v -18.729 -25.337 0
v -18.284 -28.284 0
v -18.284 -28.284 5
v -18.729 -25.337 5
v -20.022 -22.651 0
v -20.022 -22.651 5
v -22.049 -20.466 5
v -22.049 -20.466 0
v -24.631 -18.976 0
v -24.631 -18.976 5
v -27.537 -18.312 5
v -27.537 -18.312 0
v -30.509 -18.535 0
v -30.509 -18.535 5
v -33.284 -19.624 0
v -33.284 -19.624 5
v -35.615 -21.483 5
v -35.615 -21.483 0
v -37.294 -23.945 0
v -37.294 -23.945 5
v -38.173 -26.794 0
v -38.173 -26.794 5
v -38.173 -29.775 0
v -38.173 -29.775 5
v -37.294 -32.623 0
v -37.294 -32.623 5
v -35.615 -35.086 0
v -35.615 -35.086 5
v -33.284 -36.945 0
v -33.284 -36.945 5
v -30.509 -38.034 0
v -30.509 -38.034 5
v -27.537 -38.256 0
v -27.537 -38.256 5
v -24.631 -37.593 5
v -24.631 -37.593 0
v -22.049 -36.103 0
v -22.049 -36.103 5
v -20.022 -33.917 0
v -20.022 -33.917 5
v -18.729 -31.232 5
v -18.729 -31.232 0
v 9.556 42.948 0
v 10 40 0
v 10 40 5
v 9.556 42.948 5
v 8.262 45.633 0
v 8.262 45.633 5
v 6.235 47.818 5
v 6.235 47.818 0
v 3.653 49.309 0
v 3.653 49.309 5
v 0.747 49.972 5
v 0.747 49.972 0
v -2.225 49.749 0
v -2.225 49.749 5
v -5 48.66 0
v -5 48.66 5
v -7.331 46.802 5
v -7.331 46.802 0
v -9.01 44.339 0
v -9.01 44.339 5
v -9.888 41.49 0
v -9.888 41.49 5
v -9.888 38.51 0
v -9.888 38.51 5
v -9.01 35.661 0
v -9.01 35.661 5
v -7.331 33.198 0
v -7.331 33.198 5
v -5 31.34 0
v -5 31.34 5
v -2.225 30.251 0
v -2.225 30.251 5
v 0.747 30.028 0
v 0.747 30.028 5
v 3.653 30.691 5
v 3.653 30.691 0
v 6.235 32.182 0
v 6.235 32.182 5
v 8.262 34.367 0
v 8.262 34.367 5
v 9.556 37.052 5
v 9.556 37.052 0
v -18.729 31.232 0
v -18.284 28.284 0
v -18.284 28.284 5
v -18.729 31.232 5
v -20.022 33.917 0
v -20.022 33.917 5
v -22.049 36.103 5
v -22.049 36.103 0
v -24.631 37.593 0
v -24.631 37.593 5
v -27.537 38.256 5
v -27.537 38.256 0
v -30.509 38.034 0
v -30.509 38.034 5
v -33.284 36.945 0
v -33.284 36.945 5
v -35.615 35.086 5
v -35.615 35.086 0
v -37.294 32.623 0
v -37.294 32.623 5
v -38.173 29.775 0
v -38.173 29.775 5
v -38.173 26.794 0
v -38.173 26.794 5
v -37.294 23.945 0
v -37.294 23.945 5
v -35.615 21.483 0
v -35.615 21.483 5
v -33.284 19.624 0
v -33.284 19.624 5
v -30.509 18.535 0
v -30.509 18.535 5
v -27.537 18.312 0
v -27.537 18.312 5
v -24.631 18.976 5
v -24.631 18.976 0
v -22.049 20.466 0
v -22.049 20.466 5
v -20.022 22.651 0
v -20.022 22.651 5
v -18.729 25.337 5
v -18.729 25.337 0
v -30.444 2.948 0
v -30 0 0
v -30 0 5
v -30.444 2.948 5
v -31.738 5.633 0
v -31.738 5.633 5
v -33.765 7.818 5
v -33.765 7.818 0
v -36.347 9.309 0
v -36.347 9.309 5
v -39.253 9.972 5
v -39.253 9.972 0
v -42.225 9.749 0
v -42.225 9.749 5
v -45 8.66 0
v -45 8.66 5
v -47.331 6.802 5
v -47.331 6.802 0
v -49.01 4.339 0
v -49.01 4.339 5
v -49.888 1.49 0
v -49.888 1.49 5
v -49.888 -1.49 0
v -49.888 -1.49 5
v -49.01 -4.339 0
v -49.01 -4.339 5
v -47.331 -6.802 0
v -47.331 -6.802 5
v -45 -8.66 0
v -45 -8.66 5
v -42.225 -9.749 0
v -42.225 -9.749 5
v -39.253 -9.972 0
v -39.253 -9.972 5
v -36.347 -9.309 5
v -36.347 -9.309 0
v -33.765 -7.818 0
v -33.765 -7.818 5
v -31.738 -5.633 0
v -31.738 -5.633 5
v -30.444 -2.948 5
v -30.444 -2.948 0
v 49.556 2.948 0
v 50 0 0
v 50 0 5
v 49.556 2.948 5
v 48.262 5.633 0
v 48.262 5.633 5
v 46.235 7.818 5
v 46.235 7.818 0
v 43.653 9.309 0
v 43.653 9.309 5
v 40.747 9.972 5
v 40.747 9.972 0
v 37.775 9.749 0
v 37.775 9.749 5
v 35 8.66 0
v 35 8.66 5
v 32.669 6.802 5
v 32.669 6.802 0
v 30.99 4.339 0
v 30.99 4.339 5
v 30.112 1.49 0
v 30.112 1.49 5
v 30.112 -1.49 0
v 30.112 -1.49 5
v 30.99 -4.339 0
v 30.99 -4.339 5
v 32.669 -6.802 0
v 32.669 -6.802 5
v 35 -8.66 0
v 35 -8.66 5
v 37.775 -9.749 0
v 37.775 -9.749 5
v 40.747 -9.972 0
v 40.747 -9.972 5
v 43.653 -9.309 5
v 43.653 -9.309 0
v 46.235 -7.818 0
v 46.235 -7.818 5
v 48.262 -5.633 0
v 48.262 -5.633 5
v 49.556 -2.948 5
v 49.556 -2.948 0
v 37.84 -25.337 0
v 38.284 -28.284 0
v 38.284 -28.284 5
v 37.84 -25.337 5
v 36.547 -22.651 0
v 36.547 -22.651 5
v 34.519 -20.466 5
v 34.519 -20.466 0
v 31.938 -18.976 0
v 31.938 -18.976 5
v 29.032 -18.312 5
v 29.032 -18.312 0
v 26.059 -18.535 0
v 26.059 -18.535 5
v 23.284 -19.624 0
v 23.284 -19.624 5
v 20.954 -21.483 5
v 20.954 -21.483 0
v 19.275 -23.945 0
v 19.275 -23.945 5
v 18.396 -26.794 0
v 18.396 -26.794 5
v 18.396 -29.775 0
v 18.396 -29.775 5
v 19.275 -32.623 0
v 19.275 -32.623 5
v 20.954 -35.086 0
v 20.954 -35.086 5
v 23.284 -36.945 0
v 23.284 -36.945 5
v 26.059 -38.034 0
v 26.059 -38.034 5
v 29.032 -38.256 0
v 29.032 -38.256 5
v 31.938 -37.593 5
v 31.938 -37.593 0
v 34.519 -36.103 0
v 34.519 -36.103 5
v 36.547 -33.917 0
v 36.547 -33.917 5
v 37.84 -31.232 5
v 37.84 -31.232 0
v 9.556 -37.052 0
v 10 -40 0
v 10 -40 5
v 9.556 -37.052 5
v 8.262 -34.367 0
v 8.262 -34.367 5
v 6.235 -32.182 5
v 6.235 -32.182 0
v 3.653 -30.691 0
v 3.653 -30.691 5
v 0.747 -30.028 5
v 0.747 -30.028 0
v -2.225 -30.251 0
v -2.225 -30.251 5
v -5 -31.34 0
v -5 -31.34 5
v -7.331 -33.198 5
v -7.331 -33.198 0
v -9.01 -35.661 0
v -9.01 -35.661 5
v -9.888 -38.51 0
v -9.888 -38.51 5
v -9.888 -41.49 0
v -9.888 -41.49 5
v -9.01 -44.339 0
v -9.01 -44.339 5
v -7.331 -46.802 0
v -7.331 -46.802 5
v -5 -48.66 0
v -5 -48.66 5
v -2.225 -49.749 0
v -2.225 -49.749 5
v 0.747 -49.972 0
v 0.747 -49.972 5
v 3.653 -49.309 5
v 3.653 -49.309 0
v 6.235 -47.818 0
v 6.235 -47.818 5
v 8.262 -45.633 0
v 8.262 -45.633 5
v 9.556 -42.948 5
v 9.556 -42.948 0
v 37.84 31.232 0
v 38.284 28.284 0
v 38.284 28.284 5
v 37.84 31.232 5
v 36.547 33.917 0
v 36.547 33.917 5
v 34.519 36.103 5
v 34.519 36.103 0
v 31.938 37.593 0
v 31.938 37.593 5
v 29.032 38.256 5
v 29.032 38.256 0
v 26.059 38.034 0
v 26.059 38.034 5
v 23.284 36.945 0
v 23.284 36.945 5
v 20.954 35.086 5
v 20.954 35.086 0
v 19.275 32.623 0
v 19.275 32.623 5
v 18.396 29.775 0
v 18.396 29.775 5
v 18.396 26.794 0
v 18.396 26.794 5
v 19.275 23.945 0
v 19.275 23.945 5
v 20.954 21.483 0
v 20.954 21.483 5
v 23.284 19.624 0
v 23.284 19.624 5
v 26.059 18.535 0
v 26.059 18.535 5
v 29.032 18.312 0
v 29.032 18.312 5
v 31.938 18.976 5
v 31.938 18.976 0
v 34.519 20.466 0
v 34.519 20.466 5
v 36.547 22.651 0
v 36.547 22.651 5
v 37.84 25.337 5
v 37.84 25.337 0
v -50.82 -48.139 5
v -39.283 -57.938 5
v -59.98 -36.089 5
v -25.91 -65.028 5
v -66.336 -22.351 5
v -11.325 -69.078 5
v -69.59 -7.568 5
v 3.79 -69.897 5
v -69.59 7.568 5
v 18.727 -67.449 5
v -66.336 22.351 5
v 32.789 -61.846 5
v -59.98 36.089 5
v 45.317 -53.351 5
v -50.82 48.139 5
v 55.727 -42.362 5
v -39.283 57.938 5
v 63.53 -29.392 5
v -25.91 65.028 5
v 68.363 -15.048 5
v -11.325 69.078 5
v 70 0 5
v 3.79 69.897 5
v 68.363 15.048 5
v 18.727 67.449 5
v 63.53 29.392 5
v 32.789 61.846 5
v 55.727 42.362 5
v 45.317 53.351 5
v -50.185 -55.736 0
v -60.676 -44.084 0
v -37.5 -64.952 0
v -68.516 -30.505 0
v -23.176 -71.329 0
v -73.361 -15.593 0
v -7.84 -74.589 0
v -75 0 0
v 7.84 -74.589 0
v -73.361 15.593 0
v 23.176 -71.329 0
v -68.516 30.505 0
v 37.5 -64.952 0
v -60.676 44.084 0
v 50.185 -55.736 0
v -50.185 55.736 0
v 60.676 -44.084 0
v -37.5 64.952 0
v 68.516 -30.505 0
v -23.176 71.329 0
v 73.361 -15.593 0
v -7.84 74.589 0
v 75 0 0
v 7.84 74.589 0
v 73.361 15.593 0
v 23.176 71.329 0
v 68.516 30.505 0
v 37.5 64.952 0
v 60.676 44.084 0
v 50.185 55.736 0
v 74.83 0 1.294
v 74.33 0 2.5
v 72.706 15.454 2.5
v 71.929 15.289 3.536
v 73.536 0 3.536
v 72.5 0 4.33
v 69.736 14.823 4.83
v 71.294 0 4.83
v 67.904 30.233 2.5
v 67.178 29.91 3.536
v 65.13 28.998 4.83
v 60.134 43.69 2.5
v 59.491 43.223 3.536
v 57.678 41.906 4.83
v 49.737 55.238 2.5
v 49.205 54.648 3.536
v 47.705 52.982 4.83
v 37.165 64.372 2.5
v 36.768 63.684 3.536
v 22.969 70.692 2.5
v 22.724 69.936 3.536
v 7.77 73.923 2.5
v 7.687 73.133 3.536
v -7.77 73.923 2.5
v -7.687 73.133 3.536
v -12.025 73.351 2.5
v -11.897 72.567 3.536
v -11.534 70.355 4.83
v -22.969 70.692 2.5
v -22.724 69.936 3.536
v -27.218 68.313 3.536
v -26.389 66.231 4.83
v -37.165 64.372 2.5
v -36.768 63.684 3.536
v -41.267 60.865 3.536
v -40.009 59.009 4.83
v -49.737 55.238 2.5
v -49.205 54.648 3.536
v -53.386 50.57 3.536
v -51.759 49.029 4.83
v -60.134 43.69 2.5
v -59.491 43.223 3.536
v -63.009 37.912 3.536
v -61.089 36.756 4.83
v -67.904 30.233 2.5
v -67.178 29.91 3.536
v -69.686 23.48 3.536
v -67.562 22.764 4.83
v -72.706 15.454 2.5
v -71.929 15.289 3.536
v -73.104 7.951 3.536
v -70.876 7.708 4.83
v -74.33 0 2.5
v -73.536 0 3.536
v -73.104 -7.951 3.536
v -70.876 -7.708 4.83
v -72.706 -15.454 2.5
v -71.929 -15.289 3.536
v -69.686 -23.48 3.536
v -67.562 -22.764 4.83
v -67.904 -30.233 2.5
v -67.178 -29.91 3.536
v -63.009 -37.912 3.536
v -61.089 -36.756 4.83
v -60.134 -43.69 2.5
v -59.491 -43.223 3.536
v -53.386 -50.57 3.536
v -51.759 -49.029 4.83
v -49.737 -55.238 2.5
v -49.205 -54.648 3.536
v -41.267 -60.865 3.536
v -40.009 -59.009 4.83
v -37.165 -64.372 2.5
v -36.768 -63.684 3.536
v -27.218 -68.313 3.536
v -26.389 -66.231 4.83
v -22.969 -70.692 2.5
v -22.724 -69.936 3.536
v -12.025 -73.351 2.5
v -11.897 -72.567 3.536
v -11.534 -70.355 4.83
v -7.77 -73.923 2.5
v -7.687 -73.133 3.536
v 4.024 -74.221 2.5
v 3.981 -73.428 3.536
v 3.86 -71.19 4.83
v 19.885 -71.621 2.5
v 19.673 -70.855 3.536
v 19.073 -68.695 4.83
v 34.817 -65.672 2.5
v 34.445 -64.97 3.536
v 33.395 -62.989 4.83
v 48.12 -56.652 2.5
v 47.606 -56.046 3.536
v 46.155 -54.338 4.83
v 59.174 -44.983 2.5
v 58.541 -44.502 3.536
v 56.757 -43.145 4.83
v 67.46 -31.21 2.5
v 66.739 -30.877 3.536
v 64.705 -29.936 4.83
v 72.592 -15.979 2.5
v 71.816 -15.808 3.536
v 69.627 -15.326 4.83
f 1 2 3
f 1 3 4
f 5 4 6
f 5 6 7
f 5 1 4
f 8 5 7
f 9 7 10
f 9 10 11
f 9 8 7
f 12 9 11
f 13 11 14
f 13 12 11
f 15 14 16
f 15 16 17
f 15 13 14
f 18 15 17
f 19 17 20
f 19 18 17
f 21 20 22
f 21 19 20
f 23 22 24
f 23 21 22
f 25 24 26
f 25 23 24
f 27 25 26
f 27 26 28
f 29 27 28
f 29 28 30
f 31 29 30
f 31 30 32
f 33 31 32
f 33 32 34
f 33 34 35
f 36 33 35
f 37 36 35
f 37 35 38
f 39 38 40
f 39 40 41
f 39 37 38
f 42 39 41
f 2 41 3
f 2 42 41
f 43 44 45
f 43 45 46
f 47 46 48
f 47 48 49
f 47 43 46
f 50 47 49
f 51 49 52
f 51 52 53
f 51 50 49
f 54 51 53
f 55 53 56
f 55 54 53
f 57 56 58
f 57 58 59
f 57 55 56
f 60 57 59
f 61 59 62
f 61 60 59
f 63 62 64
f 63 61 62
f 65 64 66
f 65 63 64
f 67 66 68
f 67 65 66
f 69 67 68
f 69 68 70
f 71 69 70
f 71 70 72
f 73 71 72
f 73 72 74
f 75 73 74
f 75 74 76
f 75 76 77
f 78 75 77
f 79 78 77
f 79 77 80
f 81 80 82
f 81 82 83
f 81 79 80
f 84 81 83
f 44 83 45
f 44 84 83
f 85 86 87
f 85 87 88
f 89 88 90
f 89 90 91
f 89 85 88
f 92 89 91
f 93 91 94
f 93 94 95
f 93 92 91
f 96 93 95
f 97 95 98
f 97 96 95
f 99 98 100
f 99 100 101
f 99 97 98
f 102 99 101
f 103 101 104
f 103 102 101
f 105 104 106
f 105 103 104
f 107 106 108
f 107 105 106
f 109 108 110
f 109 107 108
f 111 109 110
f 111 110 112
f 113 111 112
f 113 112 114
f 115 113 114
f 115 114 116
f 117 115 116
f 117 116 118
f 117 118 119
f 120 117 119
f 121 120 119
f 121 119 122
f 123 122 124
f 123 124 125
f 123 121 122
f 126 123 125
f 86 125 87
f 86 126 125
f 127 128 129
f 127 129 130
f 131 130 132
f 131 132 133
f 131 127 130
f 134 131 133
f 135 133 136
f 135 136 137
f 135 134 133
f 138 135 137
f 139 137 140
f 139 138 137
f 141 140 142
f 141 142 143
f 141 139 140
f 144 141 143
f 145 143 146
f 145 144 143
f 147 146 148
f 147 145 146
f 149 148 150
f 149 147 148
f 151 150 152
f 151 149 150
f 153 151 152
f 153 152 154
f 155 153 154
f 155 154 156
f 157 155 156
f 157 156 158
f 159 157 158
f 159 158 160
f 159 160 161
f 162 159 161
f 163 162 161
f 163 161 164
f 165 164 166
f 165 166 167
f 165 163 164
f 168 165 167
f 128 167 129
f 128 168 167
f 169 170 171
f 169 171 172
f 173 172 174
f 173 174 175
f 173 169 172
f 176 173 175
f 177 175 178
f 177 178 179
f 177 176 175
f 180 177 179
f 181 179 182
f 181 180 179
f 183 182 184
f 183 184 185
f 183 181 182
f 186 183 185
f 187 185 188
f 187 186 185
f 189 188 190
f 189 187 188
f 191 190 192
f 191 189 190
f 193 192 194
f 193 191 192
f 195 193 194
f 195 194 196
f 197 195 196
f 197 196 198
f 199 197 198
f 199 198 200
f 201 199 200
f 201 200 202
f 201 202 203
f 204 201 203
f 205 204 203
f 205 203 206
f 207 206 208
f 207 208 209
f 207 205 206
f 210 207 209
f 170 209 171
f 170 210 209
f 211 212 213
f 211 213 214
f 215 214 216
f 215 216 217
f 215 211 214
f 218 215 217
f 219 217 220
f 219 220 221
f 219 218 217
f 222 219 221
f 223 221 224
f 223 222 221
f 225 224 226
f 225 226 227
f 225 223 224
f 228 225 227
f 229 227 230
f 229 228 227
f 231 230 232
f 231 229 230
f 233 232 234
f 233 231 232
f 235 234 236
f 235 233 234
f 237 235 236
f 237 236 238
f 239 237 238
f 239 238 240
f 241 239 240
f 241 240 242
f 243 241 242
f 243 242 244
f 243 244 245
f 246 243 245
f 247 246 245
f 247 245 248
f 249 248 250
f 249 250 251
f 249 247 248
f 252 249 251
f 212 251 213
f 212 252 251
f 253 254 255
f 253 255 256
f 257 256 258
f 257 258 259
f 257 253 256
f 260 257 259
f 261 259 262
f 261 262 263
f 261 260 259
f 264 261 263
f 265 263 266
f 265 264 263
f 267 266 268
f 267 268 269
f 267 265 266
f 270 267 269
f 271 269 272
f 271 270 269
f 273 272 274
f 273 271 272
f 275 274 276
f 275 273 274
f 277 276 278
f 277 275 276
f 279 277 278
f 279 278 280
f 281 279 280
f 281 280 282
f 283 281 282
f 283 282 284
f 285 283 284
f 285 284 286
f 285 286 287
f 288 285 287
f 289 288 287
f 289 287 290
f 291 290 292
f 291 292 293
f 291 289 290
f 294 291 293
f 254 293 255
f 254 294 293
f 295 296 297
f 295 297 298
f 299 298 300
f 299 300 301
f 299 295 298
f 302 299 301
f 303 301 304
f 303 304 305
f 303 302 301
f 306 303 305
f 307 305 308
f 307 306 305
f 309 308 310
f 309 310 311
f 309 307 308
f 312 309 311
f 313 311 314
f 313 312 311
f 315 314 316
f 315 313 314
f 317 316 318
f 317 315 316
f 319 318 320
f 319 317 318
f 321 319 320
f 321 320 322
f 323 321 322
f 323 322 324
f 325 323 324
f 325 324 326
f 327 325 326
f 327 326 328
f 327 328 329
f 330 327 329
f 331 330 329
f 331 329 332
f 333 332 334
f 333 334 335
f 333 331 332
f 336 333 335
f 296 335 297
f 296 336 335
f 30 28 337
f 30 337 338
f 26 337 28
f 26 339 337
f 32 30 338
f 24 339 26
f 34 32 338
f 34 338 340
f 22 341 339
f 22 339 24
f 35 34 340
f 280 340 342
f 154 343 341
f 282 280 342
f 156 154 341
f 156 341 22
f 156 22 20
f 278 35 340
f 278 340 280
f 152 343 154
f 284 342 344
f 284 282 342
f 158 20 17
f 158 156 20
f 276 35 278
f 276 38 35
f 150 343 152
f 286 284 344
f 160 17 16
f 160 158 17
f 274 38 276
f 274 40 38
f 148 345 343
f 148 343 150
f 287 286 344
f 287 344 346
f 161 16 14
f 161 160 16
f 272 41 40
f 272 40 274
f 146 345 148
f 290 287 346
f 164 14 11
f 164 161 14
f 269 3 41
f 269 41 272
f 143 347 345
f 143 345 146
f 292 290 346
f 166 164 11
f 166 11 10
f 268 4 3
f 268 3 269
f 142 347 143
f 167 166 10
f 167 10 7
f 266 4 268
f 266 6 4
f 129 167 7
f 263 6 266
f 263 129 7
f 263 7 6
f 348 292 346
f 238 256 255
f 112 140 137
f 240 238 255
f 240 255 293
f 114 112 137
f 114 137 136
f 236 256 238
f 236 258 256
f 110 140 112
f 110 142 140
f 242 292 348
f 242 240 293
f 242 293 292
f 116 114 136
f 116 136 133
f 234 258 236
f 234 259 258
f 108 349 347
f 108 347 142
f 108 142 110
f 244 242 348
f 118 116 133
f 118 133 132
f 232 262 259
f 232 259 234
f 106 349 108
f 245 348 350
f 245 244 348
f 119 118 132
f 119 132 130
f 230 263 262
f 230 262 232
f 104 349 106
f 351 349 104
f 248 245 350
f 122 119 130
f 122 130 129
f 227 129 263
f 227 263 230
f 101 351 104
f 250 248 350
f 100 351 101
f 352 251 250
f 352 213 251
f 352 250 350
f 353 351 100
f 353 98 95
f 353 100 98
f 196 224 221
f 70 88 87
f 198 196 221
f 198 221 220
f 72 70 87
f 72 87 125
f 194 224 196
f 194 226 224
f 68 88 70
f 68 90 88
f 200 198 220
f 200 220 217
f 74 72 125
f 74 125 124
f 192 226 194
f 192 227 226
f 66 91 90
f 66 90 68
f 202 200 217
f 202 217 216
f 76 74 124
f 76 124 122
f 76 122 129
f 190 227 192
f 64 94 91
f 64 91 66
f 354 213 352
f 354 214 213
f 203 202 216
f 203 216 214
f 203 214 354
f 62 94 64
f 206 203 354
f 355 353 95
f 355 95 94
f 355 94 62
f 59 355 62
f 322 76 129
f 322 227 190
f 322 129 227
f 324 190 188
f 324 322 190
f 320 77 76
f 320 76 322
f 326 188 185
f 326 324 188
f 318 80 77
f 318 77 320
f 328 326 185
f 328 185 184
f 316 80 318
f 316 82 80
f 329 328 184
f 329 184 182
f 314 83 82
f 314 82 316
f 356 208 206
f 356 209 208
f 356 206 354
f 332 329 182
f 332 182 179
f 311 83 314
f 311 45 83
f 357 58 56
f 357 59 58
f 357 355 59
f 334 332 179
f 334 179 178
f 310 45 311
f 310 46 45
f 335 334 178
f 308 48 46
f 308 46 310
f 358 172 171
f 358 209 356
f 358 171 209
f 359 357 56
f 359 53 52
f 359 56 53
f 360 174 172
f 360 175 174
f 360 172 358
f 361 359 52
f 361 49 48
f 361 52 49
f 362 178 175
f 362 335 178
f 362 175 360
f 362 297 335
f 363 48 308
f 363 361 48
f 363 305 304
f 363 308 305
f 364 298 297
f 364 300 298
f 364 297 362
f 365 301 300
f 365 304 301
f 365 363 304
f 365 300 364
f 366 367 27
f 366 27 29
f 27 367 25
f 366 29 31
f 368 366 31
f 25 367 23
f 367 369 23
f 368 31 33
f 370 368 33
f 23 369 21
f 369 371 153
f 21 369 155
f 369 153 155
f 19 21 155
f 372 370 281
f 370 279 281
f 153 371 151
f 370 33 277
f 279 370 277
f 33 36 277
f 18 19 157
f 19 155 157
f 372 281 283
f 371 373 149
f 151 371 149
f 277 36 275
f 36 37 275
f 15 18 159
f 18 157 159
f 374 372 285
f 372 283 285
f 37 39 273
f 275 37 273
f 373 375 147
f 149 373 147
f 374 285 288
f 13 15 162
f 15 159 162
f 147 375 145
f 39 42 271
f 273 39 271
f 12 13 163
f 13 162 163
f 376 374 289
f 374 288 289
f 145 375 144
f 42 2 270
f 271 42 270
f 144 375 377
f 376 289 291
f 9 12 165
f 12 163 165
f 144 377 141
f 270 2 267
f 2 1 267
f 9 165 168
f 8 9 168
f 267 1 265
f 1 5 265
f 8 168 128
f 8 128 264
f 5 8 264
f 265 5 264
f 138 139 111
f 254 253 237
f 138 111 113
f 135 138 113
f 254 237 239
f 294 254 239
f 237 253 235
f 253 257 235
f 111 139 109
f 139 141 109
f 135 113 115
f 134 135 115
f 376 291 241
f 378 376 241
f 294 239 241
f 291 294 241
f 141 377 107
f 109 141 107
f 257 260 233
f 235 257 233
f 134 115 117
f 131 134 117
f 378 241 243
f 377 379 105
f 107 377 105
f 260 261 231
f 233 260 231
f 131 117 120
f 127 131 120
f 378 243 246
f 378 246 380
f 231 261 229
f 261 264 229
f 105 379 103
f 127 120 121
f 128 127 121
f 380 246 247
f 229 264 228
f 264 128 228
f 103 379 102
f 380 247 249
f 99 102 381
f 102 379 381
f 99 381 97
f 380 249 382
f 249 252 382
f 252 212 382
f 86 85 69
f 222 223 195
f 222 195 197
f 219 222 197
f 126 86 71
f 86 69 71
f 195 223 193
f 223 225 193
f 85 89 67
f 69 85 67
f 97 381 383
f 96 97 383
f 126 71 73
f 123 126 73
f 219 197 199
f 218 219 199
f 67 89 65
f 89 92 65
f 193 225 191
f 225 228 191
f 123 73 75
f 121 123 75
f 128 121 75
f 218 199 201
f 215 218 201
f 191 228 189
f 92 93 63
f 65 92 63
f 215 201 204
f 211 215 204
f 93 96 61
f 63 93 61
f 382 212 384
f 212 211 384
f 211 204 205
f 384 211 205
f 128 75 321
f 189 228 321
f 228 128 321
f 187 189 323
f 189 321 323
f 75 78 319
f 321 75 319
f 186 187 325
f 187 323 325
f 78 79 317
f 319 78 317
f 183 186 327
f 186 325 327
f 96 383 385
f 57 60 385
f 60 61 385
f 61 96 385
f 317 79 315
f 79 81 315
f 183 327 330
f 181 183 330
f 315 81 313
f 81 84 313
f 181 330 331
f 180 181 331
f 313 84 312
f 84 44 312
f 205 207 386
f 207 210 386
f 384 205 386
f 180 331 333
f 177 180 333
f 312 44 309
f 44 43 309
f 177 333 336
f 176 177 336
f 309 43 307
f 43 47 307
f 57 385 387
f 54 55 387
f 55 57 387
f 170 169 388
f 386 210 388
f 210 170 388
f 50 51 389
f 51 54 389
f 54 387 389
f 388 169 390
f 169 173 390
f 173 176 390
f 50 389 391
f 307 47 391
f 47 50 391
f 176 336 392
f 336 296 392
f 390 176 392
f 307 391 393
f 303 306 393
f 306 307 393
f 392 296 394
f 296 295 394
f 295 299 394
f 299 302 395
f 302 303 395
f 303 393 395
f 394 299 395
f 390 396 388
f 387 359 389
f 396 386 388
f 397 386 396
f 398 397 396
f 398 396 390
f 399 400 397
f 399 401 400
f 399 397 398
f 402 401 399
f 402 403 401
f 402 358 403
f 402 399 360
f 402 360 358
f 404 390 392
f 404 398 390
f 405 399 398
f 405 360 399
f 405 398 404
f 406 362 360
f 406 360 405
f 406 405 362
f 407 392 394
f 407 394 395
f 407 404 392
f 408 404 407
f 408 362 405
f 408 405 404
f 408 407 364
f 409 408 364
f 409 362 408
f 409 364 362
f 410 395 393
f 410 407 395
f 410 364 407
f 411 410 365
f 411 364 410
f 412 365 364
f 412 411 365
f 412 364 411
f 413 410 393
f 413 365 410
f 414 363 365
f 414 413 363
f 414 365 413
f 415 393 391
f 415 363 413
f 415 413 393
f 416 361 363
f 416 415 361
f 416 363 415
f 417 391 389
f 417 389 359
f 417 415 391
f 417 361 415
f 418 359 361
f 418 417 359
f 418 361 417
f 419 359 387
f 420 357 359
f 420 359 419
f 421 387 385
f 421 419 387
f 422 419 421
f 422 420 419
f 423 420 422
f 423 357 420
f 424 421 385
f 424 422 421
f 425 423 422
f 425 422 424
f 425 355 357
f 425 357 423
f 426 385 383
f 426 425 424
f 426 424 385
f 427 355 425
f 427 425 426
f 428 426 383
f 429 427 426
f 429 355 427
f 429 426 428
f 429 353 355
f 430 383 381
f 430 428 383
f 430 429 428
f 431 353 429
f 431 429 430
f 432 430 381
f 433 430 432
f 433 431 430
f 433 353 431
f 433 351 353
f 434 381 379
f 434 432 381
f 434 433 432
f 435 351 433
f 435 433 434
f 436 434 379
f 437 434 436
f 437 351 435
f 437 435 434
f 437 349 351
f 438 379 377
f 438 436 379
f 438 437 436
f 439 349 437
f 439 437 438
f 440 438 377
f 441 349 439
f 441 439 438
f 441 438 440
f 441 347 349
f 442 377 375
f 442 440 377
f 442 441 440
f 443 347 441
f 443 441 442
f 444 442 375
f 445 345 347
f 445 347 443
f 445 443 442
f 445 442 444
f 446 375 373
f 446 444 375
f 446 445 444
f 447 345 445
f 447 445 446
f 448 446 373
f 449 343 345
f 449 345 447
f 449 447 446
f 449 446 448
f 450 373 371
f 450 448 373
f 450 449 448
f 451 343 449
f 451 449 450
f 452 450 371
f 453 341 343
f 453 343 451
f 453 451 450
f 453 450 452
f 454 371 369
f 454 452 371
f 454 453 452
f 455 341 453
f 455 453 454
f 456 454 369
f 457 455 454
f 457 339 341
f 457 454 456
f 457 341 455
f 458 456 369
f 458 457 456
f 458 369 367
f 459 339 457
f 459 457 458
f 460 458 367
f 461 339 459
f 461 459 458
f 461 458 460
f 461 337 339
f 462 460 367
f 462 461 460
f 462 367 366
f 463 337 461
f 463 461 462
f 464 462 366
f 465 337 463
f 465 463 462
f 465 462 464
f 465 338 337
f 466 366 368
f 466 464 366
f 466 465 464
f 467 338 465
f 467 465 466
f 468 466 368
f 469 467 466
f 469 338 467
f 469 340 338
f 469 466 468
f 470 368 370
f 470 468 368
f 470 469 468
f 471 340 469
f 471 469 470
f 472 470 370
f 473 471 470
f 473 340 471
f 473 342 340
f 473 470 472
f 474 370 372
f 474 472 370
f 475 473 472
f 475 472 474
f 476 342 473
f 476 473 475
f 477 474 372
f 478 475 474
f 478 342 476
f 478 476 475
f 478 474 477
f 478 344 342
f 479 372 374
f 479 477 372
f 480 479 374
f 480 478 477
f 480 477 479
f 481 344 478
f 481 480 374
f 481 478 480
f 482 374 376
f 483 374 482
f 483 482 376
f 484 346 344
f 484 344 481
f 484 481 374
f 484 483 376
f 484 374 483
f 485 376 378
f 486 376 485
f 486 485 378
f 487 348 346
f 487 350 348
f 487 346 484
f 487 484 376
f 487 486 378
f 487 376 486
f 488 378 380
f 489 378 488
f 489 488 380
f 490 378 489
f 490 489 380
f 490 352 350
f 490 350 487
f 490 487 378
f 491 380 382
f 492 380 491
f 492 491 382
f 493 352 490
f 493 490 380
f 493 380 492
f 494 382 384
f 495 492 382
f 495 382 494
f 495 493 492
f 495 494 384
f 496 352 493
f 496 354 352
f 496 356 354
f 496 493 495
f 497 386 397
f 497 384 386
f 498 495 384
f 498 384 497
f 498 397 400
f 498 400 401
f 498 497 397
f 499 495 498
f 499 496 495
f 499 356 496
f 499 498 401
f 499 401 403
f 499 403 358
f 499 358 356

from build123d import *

# Parameters (mm, degrees)
F0_R     = 75
F2_DEPTH = 5
F3_R     = 4.99999
F1_R     = 10
F5_DEPTH = 5


# Not quite as in the source:
# - a fillet or chamfer is up to 0.001 mm smaller than in the source, because OpenCascade refuses the exact size
# - the program builds the solid bodies; features that only make, move or delete a surface that nothing else refers to are left out


with BuildPart() as f2:
    # F0 (on Top) → F2 (new body)
    with BuildSketch(Plane.XY):
        Circle(F0_R)
    extrude(amount=F2_DEPTH)

    # F3 (radius 5 in the source; OpenCascade refuses exactly that, so slightly less here)
    f3_edges = [f2.edges().sort_by_distance(p)[0] for p in [
        (-75, 0, 5),
    ]]
    fillet(f3_edges, radius=F3_R)

    # F1 (on face) → F5 (cut, through all)
    with BuildSketch(Plane.XY):
        with Locations((0, -40)):
            Circle(F1_R)
        with Locations((28.2842712475, -28.2842712475)):
            Circle(F1_R)
        with Locations((-28.2842712475, -28.2842712475)):
            Circle(F1_R)
        with Locations((-40, 0)):
            Circle(F1_R)
        with Locations((-28.2842712475, 28.2842712475)):
            Circle(F1_R)
        with Locations((0, 40)):
            Circle(F1_R)
        with Locations((28.2842712475, 28.2842712475)):
            Circle(F1_R)
        with Locations((40, 0)):
            Circle(F1_R)
    extrude(amount=F5_DEPTH, mode=Mode.SUBTRACT)


solid = f2.part
